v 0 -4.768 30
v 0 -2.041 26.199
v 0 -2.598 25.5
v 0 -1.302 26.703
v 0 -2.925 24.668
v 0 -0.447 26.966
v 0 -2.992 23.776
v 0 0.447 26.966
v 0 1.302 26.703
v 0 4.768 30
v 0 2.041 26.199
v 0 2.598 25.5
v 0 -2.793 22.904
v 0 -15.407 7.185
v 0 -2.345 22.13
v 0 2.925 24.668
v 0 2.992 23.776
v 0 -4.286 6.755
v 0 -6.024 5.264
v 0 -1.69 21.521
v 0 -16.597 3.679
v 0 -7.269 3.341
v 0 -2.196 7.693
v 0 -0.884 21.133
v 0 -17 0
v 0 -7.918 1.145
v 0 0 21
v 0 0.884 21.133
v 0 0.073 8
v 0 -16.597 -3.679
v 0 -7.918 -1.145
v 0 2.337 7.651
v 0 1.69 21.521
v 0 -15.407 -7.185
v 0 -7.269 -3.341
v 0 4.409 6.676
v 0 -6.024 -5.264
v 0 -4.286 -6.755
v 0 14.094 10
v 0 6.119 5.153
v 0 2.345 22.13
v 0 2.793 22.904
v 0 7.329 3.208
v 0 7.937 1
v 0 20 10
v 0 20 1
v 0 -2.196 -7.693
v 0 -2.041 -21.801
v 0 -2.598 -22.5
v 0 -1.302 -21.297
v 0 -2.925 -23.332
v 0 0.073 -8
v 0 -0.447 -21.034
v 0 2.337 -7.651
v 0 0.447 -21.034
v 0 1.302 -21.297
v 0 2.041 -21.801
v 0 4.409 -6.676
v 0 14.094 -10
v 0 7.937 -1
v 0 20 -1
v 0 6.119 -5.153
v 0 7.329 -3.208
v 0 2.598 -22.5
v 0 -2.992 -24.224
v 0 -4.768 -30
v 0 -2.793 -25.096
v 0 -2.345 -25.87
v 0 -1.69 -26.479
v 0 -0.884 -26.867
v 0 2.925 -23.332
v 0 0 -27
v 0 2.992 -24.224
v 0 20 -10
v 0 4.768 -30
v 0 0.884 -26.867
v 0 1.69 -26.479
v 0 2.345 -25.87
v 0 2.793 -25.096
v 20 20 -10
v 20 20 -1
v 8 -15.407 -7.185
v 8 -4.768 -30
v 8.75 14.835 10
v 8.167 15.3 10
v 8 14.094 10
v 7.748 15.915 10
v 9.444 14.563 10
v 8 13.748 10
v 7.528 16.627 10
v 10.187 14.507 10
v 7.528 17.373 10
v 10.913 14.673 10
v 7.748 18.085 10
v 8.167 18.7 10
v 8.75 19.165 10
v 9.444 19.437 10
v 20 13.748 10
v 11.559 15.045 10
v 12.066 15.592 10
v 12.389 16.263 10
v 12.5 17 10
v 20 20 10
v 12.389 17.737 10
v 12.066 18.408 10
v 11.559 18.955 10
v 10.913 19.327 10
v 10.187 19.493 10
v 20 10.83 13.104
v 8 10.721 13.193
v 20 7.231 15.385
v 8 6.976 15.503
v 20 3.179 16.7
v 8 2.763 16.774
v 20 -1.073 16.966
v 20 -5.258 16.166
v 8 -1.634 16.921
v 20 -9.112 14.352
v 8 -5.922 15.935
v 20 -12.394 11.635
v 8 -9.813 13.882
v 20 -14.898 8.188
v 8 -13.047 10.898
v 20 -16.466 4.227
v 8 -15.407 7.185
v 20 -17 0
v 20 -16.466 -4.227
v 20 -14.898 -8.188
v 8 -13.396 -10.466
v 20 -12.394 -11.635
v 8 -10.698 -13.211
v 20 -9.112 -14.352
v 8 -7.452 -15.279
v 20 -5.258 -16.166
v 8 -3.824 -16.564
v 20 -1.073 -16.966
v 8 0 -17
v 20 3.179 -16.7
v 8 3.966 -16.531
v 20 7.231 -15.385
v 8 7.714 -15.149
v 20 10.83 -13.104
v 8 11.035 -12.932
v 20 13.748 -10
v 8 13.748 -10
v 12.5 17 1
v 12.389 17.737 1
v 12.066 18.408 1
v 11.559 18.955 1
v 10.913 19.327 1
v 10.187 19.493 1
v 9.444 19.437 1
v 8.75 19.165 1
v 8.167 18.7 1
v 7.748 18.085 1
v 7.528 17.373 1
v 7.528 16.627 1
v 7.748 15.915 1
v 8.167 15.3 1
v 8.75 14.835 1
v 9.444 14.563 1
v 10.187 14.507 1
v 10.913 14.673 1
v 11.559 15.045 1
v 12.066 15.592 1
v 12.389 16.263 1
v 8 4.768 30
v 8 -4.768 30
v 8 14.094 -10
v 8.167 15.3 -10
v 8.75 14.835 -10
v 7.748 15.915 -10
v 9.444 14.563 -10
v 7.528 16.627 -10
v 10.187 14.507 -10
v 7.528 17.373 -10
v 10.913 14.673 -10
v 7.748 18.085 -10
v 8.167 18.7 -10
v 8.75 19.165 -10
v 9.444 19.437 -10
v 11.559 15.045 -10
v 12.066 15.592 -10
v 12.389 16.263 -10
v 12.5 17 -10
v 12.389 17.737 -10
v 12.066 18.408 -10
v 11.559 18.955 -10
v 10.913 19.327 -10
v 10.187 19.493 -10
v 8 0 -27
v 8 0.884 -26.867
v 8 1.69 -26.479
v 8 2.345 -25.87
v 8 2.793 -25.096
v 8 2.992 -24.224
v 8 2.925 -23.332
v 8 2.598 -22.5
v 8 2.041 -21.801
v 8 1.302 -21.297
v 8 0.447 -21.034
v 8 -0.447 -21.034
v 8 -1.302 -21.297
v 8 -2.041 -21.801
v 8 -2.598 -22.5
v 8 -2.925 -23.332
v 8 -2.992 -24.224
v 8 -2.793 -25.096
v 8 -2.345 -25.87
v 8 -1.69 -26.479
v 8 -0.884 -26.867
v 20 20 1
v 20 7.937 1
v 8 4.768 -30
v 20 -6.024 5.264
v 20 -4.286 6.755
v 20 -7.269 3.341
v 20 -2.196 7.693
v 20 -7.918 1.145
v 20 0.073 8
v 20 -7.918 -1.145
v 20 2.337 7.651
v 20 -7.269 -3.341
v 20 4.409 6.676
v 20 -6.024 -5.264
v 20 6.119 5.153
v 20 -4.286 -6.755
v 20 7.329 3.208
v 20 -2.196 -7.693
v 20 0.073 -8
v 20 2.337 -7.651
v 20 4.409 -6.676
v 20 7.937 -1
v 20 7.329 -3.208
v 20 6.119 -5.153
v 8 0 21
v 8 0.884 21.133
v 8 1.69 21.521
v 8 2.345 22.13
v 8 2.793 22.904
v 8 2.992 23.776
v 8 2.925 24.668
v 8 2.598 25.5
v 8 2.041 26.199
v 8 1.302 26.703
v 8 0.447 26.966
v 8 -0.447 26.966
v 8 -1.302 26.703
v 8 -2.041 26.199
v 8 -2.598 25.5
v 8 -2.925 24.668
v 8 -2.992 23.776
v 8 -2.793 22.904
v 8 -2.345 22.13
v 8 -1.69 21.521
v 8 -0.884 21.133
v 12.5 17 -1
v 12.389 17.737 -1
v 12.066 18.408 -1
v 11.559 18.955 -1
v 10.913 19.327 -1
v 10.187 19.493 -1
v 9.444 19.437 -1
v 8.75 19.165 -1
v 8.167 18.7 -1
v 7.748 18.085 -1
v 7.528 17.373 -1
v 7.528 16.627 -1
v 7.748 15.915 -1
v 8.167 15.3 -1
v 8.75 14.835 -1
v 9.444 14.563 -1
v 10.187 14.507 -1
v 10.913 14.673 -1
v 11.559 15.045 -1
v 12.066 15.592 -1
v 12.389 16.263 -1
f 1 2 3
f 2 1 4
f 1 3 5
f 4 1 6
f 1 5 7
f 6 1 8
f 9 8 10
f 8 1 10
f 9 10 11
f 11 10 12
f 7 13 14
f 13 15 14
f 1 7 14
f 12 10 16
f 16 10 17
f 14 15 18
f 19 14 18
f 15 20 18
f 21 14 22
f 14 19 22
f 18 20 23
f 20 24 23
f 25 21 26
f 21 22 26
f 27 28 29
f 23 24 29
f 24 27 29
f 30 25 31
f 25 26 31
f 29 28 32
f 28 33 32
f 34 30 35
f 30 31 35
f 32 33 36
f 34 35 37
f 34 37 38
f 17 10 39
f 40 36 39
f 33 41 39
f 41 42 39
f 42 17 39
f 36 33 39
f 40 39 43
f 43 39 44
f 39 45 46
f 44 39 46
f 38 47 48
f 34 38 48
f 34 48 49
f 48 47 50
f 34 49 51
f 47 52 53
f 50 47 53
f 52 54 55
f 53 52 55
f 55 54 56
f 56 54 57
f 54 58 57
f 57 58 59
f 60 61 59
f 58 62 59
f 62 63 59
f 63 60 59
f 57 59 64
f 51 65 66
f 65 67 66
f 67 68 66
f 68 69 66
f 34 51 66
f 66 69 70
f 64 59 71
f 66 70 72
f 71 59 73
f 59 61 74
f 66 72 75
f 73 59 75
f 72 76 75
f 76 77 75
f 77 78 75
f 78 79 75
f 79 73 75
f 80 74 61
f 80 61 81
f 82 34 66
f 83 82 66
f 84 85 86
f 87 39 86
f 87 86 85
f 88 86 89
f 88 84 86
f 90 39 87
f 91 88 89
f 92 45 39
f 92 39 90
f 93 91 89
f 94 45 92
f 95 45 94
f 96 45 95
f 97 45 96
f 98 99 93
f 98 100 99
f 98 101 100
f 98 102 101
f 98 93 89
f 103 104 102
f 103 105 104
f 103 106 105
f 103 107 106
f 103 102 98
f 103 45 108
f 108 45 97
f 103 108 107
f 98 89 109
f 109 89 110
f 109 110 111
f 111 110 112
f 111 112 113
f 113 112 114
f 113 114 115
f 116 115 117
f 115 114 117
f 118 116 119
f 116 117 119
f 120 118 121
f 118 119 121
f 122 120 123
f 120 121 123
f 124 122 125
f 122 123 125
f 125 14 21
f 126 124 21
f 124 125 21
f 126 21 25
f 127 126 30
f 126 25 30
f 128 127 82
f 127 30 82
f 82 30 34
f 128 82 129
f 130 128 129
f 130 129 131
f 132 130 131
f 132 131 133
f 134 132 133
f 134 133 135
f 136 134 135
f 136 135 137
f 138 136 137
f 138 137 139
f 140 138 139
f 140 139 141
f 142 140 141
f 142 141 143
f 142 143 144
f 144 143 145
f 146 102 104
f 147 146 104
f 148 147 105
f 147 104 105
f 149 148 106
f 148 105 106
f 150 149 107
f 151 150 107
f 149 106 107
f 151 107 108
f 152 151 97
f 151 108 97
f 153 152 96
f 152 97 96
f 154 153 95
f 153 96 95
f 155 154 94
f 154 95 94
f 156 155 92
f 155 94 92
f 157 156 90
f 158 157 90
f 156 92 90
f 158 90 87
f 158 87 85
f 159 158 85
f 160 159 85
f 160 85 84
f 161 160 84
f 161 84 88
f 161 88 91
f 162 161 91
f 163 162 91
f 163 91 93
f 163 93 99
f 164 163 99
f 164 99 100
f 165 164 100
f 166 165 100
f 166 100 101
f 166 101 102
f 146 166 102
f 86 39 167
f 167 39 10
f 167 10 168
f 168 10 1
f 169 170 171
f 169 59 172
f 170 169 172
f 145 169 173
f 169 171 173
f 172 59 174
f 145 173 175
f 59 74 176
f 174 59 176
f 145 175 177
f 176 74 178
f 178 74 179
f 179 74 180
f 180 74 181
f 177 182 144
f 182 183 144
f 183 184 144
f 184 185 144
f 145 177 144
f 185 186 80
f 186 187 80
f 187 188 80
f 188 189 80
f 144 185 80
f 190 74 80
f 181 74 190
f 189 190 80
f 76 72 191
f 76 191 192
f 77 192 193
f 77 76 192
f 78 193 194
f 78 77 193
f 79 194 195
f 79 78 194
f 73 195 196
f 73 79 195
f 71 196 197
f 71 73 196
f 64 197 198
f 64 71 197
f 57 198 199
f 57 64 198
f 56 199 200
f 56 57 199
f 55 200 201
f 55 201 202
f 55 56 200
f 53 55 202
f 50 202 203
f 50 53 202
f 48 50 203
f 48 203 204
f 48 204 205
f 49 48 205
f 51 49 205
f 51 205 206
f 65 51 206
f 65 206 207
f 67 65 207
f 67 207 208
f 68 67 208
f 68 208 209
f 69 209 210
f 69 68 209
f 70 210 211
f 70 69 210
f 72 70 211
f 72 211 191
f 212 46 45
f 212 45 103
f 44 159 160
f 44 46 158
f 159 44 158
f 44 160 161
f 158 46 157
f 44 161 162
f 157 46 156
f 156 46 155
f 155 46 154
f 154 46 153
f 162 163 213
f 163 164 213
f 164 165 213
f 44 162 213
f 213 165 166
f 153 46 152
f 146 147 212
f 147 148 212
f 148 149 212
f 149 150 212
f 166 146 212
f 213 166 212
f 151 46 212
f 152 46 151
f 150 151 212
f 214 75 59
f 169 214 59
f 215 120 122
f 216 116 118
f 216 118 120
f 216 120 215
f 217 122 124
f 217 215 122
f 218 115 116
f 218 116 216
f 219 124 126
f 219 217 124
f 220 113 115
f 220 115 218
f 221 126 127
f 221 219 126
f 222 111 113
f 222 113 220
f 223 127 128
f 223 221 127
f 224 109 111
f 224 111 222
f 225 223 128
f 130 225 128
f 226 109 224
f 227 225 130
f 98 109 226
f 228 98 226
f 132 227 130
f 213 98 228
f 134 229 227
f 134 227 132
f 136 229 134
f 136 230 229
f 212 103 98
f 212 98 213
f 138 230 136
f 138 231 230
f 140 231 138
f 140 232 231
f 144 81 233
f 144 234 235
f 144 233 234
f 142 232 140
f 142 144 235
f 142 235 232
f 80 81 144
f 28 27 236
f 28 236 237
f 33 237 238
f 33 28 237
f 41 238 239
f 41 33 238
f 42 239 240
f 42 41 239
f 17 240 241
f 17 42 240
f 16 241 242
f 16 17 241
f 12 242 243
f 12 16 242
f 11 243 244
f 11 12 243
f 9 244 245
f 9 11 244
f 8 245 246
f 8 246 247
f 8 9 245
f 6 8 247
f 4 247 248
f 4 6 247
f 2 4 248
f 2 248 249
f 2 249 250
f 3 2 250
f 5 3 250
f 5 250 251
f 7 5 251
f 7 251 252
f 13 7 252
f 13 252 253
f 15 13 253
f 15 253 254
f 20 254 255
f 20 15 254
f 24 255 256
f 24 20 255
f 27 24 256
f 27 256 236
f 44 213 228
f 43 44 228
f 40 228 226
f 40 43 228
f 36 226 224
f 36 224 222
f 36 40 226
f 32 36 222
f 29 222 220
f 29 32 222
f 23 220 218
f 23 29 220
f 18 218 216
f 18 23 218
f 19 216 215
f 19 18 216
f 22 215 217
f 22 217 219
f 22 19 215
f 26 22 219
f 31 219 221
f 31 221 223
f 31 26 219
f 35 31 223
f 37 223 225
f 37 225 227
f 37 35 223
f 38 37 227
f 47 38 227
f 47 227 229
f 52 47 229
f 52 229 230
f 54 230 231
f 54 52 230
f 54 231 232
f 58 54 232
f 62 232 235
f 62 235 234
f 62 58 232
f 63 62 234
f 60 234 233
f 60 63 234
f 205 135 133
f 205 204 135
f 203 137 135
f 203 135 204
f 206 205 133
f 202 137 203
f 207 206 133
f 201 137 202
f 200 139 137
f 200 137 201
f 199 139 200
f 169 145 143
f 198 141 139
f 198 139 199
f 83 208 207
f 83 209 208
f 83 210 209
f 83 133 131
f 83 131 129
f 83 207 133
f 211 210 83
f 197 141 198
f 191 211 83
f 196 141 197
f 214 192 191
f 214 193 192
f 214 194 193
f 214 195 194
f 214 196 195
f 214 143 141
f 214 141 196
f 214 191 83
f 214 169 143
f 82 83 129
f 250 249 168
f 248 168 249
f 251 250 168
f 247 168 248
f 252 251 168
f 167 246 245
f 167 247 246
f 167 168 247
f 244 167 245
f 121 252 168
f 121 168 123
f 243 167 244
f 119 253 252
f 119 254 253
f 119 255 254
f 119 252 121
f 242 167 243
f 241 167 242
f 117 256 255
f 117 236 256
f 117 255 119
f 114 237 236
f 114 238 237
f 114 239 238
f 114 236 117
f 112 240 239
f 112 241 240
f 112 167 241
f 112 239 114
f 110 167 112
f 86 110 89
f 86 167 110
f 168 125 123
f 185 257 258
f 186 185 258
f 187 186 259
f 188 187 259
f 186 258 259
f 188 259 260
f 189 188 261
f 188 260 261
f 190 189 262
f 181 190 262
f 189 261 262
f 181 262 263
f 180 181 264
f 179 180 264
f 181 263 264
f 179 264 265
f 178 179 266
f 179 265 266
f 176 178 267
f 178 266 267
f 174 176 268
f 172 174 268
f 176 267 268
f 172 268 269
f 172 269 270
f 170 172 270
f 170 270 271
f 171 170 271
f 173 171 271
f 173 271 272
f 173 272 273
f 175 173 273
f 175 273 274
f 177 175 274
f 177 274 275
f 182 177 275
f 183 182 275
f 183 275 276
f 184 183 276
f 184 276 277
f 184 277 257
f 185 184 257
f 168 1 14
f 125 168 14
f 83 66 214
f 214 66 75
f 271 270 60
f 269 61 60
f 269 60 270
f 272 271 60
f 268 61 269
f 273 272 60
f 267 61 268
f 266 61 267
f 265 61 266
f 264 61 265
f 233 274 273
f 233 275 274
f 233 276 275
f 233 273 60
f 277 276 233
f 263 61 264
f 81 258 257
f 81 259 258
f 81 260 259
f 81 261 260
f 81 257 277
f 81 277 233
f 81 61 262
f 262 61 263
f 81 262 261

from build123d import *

# Parameters (mm, degrees)
SKETCH_1_R          = 3
EXTRUDE_1_DEPTH     = 8
EXTRUDE_1_2_DEPTH   = 8
SKETCH_1_3_R        = 8
EXTRUDE_2_DEPTH     = 20
EXTRUDE_3_REACH     = 53.662
SKETCH_2_W          = 20
SKETCH_2_H          = 20
SKETCH_3_W          = 20
SKETCH_3_H          = 2
CUT_EXTRUDE_1_DEPTH = 20
SKETCH_4_R          = 2.5
CUT_EXTRUDE_2_DEPTH = 49.989794856


with BuildPart() as part:
    # 草图1 → 凸台-拉伸1 (new body)
    with BuildSketch(Plane(origin=(0, 0, 0), x_dir=(0, 0, -1), z_dir=(1, 0, 0))):
        with BuildLine():
            Line((-7.18451045, 15.40723238), (-30, 4.768194878))
            Line((-30, 4.768194878), (-30, -4.768194878))
            Line((-30, -4.768194878), (-7.18451045, -15.40723238))
            ThreePointArc((-7.18451045, -15.40723238), (-17, 0), (-7.18451045, 15.40723238))
        make_face()
        with Locations((-24, 0)):
            Circle(SKETCH_1_R, mode=Mode.SUBTRACT)
    extrude(amount=EXTRUDE_1_DEPTH)



with BuildPart() as body_2:
    # 草图1 → Extrude 1 2 (new body)
    with BuildSketch(Plane(origin=(0, 0, 0), x_dir=(0, 0, -1), z_dir=(1, 0, 0))):
        with BuildLine():
            Line((30, 4.768194878), (7.18451045, 15.40723238))
            ThreePointArc((7.18451045, 15.40723238), (17, 0), (7.18451045, -15.40723238))
            Line((7.18451045, -15.40723238), (30, -4.768194878))
            Line((30, -4.768194878), (30, 4.768194878))
        make_face()
        with Locations((24, 0)):
            Circle(SKETCH_1_R, mode=Mode.SUBTRACT)
    extrude(amount=EXTRUDE_1_2_DEPTH)


with BuildPart() as part_1:
    add(part.part)

    add(body_2.part)  # 凸台-拉伸2 merges body 2
    # 草图1<3> → 凸台-拉伸2 (add)
    with BuildSketch(Plane(origin=(0, 0, 0), x_dir=(0, 0, -1), z_dir=(1, 0, 0))):
        with BuildLine():
            ThreePointArc((7.18451045, 15.40723238), (0, 17), (-7.18451045, 15.40723238))
            ThreePointArc((-7.18451045, 15.40723238), (-17, 0), (-7.18451045, -15.40723238))
            ThreePointArc((-7.18451045, -15.40723238), (0, -17), (7.18451045, -15.40723238))
            ThreePointArc((7.18451045, -15.40723238), (14.337654579, -9.134093342), (17, 0))
            ThreePointArc((17, 0), (14.337654579, 9.134093342), (7.18451045, 15.40723238))
        make_face()
        Circle(SKETCH_1_3_R, mode=Mode.SUBTRACT)
    extrude(amount=EXTRUDE_2_DEPTH)

    # 草图2 → 凸台-拉伸3 (add, up to next)
    with BuildSketch(Plane(origin=(0, 20, 0), x_dir=(1, 0, 0), z_dir=(0, 1, 0)), mode=Mode.PRIVATE) as extrude_3_sk1:
        with Locations((10, 0)):
            Rectangle(SKETCH_2_W, SKETCH_2_H)
    extrude_3_tool1 = extrude(extrude_3_sk1.sketch, amount=-EXTRUDE_3_REACH, mode=Mode.PRIVATE) - part_1.part
    add(extrude_3_tool1.solids().sort_by_distance((10, 20, 0))[0])

    # 草图3 → 切除-拉伸1 (cut)
    with BuildSketch(Plane(origin=(0, 20, 0), x_dir=(1, 0, 0), z_dir=(0, 1, 0))):
        with Locations((10, 0)):
            Rectangle(SKETCH_3_W, SKETCH_3_H)
    extrude(amount=-CUT_EXTRUDE_1_DEPTH, mode=Mode.SUBTRACT)

    # 草图4 → 切除-拉伸2 (cut, through all)
    with BuildSketch(Plane.XY.offset(10)):
        with Locations((10, 17)):
            Circle(SKETCH_4_R)
    extrude(amount=-CUT_EXTRUDE_2_DEPTH, mode=Mode.SUBTRACT)


solid = part_1.part
